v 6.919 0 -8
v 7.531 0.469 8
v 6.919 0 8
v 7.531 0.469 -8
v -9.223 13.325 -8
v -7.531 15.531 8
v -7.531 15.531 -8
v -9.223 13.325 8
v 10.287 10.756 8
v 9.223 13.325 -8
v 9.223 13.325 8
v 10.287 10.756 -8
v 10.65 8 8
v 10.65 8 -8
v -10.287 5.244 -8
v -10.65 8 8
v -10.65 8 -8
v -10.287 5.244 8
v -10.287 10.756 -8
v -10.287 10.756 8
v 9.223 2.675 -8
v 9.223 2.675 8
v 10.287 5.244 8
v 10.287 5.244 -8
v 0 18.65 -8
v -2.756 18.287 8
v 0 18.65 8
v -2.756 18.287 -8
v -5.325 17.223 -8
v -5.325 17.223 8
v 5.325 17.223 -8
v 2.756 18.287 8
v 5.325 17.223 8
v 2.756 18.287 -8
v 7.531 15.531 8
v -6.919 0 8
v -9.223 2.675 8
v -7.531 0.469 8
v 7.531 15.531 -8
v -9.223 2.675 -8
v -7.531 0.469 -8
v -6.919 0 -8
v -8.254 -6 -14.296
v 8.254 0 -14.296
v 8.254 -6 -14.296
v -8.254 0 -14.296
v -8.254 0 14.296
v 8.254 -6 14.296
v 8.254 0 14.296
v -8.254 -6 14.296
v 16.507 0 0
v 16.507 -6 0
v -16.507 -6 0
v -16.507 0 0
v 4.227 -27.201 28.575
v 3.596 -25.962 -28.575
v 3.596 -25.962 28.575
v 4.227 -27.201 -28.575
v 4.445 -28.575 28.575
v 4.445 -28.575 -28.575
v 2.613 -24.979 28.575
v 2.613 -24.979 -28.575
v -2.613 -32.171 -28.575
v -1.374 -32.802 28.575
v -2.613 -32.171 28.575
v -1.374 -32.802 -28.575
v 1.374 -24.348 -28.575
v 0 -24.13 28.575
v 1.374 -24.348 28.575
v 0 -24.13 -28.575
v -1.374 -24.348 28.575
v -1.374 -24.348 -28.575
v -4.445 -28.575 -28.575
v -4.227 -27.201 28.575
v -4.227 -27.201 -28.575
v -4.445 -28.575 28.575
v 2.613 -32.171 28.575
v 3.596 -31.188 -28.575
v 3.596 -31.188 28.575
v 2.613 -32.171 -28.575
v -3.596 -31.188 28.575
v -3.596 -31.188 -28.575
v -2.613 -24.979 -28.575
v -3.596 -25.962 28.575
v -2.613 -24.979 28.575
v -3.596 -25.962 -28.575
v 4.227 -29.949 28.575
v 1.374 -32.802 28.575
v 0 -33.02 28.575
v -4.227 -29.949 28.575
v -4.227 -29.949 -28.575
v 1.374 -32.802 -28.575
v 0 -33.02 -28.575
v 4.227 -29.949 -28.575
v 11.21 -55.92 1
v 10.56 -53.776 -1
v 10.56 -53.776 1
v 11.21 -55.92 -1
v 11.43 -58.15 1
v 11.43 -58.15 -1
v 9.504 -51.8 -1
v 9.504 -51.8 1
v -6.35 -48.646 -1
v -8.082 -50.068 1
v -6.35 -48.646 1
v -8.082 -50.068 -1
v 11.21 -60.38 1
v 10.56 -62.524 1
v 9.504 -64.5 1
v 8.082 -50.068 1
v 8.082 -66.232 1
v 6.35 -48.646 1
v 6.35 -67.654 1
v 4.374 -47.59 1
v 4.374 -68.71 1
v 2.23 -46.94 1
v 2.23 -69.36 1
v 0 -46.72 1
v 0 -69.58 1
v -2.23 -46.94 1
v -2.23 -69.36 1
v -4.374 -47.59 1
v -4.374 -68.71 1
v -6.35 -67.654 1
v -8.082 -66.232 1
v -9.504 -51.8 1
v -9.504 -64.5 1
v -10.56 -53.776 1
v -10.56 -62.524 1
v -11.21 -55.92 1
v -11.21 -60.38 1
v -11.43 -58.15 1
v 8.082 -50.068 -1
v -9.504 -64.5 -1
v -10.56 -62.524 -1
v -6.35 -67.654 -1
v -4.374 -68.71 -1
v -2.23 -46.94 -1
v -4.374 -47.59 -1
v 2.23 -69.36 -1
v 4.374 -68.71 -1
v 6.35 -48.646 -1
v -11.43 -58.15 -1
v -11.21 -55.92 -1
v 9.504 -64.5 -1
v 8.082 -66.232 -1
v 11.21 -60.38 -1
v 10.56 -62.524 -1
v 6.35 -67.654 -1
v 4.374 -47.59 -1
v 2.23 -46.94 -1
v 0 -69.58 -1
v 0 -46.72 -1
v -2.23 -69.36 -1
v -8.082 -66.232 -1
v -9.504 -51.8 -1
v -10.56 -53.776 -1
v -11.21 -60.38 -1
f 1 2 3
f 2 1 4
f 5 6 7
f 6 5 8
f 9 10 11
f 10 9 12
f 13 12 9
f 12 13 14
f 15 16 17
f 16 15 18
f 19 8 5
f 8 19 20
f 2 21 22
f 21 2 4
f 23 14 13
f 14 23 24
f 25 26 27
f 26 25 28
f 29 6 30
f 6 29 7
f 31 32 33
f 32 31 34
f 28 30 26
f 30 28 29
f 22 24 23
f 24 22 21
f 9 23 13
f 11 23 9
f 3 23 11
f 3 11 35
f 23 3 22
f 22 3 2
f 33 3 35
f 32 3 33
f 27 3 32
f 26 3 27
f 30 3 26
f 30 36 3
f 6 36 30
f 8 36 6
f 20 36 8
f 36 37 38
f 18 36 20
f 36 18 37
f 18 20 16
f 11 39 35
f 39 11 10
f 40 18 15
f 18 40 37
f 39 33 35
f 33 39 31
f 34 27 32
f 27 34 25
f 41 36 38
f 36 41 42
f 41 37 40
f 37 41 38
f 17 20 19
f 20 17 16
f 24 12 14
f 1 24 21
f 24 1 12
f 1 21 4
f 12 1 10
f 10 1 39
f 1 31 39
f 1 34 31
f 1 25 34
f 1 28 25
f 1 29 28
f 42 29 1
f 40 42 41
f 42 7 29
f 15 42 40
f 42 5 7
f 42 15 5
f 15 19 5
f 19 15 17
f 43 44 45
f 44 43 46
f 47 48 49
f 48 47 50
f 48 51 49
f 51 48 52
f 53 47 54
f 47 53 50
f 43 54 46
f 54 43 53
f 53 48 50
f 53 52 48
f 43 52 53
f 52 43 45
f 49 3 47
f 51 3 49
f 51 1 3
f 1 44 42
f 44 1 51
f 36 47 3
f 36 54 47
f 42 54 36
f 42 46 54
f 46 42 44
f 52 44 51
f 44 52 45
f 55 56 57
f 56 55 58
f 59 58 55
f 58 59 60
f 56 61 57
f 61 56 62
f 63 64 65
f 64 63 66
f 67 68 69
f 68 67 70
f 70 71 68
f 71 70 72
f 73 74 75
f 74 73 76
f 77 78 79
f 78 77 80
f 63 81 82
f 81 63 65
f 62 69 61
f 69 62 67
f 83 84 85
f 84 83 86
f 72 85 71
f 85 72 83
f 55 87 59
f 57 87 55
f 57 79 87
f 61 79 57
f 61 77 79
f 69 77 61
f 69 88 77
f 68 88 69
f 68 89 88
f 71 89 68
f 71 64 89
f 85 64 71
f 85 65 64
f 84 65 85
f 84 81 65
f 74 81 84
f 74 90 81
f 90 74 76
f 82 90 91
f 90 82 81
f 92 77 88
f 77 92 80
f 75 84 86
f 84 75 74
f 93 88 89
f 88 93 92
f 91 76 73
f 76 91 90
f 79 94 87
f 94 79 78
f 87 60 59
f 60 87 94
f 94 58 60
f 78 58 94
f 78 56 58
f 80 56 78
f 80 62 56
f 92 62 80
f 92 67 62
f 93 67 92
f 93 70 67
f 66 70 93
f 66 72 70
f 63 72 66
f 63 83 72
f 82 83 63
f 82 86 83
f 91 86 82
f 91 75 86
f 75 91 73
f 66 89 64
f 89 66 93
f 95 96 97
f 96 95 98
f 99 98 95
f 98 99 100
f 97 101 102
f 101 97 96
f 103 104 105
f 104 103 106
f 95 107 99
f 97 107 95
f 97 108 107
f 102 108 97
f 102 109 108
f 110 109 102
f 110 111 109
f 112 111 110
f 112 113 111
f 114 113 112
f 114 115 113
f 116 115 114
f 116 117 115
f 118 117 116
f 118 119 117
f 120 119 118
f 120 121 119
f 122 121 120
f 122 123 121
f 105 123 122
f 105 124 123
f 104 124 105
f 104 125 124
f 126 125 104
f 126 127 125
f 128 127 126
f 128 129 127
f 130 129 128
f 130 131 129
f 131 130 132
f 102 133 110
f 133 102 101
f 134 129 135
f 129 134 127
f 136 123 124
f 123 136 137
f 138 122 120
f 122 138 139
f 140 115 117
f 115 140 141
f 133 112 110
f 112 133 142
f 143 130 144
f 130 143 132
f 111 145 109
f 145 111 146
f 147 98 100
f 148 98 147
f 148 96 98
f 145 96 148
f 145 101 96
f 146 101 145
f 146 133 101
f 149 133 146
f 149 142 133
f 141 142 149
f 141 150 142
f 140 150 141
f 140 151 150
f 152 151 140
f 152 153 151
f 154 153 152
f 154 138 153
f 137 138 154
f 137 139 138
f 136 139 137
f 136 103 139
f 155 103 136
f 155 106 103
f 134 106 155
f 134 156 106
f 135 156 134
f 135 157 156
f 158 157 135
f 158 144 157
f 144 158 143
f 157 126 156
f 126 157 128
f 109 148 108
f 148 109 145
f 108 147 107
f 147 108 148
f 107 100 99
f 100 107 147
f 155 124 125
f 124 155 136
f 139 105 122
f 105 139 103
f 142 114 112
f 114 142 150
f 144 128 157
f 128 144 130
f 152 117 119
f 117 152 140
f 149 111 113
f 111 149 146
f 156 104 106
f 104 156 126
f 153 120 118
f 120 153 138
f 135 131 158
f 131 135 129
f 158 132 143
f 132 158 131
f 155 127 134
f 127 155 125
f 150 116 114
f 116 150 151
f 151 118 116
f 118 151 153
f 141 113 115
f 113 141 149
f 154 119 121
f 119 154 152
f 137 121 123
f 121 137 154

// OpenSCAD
// Auto-generated by scripts/author_from_manifest.py (Phase D.3).
// Source: data/phase_d_manifest.json (sku_intent='tyco-ty4251-pendent-k80-135f').
// Do not hand-edit — regenerate from the manifest.
//
// @part tyco_ty4251_pendent_k80_135f
// @kind sprinkler_head
// @category head.pendant.k80
// @display-name "Tyco TY4251 Pendent K8.0 SR 135°F"
// @mfg tyco_fire_protection
// @mfg-pn TY4251
// @listing UL FM
// @hazard-classes OH1 OH2
// @price-usd 16.90
// @install-minutes 8
// @crew journeyman
// @k-factor 8
// @orientation pendant
// @response standard
// @temperature 135F
// @param size_in number default=0.5 label="Size" unit="in"
// @port inlet position=[0,0.014,0] direction=[0,1,0] style=NPT_threaded size_in=0.5 role=drop

size_in = 0.5;
k_factor = 8.0;

length_mm   = 57.15;
body_dia_mm = 25.40;
thread_od   = 21.3;
thread_len  = 16;
deflector_d = body_dia_mm * 0.9;

 union() {
    translate([0, thread_len/2, 0])
        cylinder(h = thread_len, d = thread_od, center = true, $fn = 24);
    translate([0, -3, 0])
        rotate([90, 0, 0])
        cylinder(h = 6, d = thread_od * 1.55, $fn = 6, center = true);
    translate([0, -length_mm/2, 0])
        cylinder(h = length_mm, d = body_dia_mm * 0.35, center = true, $fn = 20);
    translate([0, -length_mm - 1, 0])
        cylinder(h = 2, d = deflector_d, center = true, $fn = 32);
}
